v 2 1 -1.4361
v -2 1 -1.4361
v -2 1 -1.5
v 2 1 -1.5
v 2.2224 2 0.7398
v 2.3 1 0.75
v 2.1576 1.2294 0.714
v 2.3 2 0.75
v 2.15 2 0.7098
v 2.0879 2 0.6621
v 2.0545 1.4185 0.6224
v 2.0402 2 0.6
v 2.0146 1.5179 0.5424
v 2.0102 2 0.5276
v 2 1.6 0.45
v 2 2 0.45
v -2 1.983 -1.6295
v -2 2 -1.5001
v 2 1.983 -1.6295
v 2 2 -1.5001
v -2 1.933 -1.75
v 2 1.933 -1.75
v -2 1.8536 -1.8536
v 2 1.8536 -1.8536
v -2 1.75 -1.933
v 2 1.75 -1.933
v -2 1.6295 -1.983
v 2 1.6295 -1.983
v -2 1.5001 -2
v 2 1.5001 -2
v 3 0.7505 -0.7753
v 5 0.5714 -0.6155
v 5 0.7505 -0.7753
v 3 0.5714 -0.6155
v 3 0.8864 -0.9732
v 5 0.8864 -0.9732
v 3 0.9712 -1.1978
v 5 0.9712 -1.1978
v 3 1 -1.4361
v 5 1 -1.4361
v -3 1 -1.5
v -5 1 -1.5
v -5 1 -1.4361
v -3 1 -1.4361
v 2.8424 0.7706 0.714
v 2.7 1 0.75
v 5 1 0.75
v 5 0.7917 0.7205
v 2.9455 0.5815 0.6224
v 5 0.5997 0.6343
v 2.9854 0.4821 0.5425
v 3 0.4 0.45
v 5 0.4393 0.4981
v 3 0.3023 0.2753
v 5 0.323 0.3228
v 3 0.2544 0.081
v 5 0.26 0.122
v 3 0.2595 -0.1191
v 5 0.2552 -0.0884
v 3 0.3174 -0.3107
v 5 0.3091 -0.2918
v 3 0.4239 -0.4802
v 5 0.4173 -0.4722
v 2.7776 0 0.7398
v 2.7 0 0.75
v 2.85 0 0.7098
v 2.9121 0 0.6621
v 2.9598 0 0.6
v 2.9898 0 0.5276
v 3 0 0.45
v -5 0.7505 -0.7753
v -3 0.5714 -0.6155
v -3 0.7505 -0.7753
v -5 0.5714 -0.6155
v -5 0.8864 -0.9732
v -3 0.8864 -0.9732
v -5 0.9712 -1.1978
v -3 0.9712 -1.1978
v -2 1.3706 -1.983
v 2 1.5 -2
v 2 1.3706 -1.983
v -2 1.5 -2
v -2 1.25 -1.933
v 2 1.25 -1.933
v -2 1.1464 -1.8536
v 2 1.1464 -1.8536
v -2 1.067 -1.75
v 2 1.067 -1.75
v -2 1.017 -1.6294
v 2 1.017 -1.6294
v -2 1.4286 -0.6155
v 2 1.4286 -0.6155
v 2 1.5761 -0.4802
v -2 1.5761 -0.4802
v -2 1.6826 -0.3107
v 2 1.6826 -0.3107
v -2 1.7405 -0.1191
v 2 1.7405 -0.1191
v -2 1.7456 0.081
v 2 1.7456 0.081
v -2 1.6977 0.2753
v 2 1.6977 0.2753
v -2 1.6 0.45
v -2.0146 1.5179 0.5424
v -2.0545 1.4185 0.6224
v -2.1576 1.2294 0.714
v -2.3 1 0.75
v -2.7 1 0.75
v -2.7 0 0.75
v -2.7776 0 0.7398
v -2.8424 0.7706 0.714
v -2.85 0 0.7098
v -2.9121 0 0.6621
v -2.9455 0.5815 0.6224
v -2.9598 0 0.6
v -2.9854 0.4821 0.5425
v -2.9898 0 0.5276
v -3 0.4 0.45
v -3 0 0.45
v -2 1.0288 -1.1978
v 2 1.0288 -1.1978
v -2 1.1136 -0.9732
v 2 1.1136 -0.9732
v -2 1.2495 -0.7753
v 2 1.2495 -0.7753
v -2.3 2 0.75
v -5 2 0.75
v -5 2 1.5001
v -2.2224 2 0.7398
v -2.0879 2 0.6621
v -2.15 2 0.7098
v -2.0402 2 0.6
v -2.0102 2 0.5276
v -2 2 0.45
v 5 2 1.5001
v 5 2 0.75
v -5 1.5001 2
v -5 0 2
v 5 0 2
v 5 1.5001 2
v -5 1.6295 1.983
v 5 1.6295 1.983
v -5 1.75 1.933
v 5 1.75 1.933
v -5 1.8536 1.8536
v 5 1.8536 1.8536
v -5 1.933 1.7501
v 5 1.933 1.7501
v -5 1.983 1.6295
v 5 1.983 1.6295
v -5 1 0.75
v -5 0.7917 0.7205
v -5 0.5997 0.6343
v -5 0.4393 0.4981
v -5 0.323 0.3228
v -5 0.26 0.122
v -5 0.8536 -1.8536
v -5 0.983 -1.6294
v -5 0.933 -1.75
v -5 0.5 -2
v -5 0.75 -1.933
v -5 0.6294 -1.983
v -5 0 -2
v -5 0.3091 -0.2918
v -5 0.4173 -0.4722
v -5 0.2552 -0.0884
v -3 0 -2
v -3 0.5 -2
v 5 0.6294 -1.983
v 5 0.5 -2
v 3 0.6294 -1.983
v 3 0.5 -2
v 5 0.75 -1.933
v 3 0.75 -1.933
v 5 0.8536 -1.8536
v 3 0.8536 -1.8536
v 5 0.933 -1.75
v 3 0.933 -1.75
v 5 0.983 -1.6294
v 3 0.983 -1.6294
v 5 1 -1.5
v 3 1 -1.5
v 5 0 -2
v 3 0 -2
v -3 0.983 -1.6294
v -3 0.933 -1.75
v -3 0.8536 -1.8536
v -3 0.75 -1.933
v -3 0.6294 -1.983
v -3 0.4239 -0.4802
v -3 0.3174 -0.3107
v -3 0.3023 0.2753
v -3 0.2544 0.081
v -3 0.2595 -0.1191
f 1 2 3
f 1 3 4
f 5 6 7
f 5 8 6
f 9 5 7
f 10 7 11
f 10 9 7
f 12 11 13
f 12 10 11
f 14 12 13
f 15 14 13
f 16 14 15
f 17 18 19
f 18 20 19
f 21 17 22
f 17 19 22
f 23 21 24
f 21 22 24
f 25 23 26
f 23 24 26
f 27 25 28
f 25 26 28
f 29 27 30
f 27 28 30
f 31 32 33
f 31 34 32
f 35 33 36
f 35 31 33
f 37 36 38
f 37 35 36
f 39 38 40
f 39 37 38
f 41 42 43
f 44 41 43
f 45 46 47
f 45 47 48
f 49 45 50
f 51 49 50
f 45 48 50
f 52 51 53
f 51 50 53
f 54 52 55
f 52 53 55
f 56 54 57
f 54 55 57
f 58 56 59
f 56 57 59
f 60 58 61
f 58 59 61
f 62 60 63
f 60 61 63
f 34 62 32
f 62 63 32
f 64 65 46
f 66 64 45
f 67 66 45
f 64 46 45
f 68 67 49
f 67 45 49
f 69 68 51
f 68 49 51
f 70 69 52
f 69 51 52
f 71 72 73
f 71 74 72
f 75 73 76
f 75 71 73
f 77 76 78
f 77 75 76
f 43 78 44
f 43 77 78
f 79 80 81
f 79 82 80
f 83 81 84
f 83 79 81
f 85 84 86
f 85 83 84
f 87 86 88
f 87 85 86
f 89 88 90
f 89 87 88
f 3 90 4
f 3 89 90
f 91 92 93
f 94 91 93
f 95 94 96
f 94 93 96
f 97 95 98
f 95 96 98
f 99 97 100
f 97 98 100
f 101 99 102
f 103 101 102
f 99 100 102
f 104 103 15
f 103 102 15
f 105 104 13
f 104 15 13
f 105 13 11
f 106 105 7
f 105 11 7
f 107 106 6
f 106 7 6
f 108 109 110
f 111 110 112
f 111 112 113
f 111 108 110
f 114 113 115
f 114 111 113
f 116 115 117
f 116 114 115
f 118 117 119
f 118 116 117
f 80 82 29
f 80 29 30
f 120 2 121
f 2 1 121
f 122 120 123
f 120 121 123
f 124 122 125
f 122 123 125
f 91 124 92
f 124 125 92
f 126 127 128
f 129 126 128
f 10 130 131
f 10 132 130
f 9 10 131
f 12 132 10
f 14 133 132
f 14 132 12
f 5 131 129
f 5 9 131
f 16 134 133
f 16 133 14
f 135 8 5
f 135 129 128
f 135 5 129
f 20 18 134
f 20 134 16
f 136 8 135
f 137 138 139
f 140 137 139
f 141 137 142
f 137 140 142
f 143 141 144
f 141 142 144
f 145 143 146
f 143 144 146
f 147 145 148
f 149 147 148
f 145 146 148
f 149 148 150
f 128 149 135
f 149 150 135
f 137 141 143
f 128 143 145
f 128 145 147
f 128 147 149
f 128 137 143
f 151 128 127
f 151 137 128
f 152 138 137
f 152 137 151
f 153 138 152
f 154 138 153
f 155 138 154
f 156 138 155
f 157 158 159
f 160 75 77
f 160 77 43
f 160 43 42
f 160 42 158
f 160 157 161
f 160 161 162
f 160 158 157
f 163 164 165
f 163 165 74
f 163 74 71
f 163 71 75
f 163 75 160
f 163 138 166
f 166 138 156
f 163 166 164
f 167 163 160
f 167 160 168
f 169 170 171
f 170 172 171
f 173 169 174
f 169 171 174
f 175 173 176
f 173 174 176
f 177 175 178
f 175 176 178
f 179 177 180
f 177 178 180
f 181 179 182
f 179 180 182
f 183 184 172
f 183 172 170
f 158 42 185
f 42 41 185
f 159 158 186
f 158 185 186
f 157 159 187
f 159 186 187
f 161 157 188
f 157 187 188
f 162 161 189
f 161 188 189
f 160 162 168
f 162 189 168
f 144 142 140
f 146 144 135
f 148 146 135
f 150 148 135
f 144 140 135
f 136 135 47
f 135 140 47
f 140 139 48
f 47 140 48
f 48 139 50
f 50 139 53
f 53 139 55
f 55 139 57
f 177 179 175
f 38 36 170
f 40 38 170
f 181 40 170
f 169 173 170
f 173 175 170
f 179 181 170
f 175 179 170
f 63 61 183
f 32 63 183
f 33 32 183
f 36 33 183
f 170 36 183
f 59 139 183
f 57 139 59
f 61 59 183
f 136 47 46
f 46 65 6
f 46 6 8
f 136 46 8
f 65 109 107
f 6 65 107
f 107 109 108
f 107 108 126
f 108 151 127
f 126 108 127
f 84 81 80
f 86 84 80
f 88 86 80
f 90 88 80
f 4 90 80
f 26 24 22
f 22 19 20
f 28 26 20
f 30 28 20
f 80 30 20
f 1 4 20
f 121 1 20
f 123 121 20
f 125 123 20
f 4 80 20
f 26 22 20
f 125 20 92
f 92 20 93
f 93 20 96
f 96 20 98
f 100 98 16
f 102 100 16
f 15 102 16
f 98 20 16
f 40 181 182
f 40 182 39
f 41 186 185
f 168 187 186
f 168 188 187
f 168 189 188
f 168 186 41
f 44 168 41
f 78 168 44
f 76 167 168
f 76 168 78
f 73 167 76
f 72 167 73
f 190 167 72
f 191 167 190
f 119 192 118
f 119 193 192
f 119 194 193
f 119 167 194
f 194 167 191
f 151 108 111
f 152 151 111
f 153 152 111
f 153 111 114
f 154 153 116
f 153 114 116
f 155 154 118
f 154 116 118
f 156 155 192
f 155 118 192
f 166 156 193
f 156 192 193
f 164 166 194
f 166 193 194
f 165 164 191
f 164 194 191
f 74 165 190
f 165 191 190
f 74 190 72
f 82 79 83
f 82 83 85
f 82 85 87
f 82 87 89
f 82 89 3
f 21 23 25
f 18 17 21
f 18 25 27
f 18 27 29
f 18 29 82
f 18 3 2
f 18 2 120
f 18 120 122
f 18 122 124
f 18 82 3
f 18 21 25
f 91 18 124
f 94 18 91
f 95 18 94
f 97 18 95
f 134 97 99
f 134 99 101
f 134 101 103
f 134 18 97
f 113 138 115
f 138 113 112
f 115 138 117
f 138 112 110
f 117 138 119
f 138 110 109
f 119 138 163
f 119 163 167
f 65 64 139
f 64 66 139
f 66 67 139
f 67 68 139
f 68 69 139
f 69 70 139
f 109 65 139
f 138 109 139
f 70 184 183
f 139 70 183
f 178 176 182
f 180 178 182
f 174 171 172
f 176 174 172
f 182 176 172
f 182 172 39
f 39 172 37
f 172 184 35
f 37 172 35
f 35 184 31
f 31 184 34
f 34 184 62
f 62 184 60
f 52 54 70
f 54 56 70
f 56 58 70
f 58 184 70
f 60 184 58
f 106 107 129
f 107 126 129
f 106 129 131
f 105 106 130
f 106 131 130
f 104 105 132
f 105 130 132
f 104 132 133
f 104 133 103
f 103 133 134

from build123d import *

# Parameters (mm, degrees)
ESQUISSE1_W             = 10
ESQUISSE1_H             = 4
BOSS_EXTRU_1_DEPTH      = 2
ESQUISSE2_R             = 0.75
ENL_V_MAT_EXTRU_1_DEPTH = 10
ESQUISSE7_W             = 2.75
ESQUISSE7_H             = 1
ENL_V_MAT_EXTRU_3_DEPTH = 3
ESQUISSE8_W             = 3
ESQUISSE8_H             = 2.75
ENL_V_MAT_EXTRU_5_DEPTH = 1
CONG_1_R                = 1
CONG_2_R                = 0.5
CONG_3_R                = 0.5
CONG_4_R                = 0.3


with BuildPart() as part:
    # Esquisse1 → Boss.-Extru.1 (new body)
    with BuildSketch(Plane(origin=(0, 0, 0), x_dir=(1, 0, 0), z_dir=(0, 1, 0))):
        Rectangle(ESQUISSE1_W, ESQUISSE1_H)
    extrude(amount=BOSS_EXTRU_1_DEPTH)

    # Esquisse2 → Enlèv. mat.-Extru.1 (cut)
    with BuildSketch(Plane(origin=(5, 0, 0), x_dir=(0, 0, -1), z_dir=(1, 0, 0))):
        with Locations((0, 1)):
            Circle(ESQUISSE2_R)
    extrude(amount=-ENL_V_MAT_EXTRU_1_DEPTH, mode=Mode.SUBTRACT)

    # Esquisse7 → Enlèv. mat.-Extru.3 (cut)
    with BuildSketch(Plane.ZY.offset(5)):
        with Locations((-0.625, 1.5)):
            Rectangle(ESQUISSE7_W, ESQUISSE7_H)
    enl_v_mat_extru_3 = extrude(amount=-ENL_V_MAT_EXTRU_3_DEPTH, mode=Mode.SUBTRACT)

    # Symétrie1: Enlèv. mat.-Extru.3 across plane
    add(enl_v_mat_extru_3.mirror(Plane.ZY), mode=Mode.SUBTRACT)

    # Esquisse8 → Enlèv. mat.-Extru.5 (cut)
    with BuildSketch(Plane.XZ):
        with Locations((-1.5, -0.625)):
            Rectangle(ESQUISSE8_W, ESQUISSE8_H)
    enl_v_mat_extru_5 = extrude(amount=-ENL_V_MAT_EXTRU_5_DEPTH, mode=Mode.SUBTRACT)

    # Symétrie3: Enlèv. mat.-Extru.5 across plane
    add(enl_v_mat_extru_5.mirror(Plane.ZY), mode=Mode.SUBTRACT)

    # Congé1
    cong_1_edges = [part.edges().sort_by_distance(p)[0] for p in [
        (-4, 1, -0.75),
        (0, 1, -0.75),
        (4, 1, -0.75),
    ]]
    fillet(cong_1_edges, radius=CONG_1_R)

    # Congé2
    cong_2_edges = [part.edges().sort_by_distance(p)[0] for p in [
        (-4, 1, -2),
        (0, 1, -2),
        (4, 1, -2),
    ]]
    fillet(cong_2_edges, radius=CONG_2_R)

    # Congé3
    cong_3_edges = [part.edges().sort_by_distance(p)[0] for p in [
        (0, 2, -2),
        (0, 2, 2),
    ]]
    fillet(cong_3_edges, radius=CONG_3_R - 0.0001)  # a hair under: the kernel refuses the full size

    # Congé4
    cong_4_edges = [part.edges().sort_by_distance(p)[0] for p in [
        (-2, 1.5, 0.75),
        (2, 1.5, 0.75),
        (-3, 0.5, 0.75),
        (3, 0.5, 0.75),
    ]]
    fillet(cong_4_edges, radius=CONG_4_R)


solid = part.part
